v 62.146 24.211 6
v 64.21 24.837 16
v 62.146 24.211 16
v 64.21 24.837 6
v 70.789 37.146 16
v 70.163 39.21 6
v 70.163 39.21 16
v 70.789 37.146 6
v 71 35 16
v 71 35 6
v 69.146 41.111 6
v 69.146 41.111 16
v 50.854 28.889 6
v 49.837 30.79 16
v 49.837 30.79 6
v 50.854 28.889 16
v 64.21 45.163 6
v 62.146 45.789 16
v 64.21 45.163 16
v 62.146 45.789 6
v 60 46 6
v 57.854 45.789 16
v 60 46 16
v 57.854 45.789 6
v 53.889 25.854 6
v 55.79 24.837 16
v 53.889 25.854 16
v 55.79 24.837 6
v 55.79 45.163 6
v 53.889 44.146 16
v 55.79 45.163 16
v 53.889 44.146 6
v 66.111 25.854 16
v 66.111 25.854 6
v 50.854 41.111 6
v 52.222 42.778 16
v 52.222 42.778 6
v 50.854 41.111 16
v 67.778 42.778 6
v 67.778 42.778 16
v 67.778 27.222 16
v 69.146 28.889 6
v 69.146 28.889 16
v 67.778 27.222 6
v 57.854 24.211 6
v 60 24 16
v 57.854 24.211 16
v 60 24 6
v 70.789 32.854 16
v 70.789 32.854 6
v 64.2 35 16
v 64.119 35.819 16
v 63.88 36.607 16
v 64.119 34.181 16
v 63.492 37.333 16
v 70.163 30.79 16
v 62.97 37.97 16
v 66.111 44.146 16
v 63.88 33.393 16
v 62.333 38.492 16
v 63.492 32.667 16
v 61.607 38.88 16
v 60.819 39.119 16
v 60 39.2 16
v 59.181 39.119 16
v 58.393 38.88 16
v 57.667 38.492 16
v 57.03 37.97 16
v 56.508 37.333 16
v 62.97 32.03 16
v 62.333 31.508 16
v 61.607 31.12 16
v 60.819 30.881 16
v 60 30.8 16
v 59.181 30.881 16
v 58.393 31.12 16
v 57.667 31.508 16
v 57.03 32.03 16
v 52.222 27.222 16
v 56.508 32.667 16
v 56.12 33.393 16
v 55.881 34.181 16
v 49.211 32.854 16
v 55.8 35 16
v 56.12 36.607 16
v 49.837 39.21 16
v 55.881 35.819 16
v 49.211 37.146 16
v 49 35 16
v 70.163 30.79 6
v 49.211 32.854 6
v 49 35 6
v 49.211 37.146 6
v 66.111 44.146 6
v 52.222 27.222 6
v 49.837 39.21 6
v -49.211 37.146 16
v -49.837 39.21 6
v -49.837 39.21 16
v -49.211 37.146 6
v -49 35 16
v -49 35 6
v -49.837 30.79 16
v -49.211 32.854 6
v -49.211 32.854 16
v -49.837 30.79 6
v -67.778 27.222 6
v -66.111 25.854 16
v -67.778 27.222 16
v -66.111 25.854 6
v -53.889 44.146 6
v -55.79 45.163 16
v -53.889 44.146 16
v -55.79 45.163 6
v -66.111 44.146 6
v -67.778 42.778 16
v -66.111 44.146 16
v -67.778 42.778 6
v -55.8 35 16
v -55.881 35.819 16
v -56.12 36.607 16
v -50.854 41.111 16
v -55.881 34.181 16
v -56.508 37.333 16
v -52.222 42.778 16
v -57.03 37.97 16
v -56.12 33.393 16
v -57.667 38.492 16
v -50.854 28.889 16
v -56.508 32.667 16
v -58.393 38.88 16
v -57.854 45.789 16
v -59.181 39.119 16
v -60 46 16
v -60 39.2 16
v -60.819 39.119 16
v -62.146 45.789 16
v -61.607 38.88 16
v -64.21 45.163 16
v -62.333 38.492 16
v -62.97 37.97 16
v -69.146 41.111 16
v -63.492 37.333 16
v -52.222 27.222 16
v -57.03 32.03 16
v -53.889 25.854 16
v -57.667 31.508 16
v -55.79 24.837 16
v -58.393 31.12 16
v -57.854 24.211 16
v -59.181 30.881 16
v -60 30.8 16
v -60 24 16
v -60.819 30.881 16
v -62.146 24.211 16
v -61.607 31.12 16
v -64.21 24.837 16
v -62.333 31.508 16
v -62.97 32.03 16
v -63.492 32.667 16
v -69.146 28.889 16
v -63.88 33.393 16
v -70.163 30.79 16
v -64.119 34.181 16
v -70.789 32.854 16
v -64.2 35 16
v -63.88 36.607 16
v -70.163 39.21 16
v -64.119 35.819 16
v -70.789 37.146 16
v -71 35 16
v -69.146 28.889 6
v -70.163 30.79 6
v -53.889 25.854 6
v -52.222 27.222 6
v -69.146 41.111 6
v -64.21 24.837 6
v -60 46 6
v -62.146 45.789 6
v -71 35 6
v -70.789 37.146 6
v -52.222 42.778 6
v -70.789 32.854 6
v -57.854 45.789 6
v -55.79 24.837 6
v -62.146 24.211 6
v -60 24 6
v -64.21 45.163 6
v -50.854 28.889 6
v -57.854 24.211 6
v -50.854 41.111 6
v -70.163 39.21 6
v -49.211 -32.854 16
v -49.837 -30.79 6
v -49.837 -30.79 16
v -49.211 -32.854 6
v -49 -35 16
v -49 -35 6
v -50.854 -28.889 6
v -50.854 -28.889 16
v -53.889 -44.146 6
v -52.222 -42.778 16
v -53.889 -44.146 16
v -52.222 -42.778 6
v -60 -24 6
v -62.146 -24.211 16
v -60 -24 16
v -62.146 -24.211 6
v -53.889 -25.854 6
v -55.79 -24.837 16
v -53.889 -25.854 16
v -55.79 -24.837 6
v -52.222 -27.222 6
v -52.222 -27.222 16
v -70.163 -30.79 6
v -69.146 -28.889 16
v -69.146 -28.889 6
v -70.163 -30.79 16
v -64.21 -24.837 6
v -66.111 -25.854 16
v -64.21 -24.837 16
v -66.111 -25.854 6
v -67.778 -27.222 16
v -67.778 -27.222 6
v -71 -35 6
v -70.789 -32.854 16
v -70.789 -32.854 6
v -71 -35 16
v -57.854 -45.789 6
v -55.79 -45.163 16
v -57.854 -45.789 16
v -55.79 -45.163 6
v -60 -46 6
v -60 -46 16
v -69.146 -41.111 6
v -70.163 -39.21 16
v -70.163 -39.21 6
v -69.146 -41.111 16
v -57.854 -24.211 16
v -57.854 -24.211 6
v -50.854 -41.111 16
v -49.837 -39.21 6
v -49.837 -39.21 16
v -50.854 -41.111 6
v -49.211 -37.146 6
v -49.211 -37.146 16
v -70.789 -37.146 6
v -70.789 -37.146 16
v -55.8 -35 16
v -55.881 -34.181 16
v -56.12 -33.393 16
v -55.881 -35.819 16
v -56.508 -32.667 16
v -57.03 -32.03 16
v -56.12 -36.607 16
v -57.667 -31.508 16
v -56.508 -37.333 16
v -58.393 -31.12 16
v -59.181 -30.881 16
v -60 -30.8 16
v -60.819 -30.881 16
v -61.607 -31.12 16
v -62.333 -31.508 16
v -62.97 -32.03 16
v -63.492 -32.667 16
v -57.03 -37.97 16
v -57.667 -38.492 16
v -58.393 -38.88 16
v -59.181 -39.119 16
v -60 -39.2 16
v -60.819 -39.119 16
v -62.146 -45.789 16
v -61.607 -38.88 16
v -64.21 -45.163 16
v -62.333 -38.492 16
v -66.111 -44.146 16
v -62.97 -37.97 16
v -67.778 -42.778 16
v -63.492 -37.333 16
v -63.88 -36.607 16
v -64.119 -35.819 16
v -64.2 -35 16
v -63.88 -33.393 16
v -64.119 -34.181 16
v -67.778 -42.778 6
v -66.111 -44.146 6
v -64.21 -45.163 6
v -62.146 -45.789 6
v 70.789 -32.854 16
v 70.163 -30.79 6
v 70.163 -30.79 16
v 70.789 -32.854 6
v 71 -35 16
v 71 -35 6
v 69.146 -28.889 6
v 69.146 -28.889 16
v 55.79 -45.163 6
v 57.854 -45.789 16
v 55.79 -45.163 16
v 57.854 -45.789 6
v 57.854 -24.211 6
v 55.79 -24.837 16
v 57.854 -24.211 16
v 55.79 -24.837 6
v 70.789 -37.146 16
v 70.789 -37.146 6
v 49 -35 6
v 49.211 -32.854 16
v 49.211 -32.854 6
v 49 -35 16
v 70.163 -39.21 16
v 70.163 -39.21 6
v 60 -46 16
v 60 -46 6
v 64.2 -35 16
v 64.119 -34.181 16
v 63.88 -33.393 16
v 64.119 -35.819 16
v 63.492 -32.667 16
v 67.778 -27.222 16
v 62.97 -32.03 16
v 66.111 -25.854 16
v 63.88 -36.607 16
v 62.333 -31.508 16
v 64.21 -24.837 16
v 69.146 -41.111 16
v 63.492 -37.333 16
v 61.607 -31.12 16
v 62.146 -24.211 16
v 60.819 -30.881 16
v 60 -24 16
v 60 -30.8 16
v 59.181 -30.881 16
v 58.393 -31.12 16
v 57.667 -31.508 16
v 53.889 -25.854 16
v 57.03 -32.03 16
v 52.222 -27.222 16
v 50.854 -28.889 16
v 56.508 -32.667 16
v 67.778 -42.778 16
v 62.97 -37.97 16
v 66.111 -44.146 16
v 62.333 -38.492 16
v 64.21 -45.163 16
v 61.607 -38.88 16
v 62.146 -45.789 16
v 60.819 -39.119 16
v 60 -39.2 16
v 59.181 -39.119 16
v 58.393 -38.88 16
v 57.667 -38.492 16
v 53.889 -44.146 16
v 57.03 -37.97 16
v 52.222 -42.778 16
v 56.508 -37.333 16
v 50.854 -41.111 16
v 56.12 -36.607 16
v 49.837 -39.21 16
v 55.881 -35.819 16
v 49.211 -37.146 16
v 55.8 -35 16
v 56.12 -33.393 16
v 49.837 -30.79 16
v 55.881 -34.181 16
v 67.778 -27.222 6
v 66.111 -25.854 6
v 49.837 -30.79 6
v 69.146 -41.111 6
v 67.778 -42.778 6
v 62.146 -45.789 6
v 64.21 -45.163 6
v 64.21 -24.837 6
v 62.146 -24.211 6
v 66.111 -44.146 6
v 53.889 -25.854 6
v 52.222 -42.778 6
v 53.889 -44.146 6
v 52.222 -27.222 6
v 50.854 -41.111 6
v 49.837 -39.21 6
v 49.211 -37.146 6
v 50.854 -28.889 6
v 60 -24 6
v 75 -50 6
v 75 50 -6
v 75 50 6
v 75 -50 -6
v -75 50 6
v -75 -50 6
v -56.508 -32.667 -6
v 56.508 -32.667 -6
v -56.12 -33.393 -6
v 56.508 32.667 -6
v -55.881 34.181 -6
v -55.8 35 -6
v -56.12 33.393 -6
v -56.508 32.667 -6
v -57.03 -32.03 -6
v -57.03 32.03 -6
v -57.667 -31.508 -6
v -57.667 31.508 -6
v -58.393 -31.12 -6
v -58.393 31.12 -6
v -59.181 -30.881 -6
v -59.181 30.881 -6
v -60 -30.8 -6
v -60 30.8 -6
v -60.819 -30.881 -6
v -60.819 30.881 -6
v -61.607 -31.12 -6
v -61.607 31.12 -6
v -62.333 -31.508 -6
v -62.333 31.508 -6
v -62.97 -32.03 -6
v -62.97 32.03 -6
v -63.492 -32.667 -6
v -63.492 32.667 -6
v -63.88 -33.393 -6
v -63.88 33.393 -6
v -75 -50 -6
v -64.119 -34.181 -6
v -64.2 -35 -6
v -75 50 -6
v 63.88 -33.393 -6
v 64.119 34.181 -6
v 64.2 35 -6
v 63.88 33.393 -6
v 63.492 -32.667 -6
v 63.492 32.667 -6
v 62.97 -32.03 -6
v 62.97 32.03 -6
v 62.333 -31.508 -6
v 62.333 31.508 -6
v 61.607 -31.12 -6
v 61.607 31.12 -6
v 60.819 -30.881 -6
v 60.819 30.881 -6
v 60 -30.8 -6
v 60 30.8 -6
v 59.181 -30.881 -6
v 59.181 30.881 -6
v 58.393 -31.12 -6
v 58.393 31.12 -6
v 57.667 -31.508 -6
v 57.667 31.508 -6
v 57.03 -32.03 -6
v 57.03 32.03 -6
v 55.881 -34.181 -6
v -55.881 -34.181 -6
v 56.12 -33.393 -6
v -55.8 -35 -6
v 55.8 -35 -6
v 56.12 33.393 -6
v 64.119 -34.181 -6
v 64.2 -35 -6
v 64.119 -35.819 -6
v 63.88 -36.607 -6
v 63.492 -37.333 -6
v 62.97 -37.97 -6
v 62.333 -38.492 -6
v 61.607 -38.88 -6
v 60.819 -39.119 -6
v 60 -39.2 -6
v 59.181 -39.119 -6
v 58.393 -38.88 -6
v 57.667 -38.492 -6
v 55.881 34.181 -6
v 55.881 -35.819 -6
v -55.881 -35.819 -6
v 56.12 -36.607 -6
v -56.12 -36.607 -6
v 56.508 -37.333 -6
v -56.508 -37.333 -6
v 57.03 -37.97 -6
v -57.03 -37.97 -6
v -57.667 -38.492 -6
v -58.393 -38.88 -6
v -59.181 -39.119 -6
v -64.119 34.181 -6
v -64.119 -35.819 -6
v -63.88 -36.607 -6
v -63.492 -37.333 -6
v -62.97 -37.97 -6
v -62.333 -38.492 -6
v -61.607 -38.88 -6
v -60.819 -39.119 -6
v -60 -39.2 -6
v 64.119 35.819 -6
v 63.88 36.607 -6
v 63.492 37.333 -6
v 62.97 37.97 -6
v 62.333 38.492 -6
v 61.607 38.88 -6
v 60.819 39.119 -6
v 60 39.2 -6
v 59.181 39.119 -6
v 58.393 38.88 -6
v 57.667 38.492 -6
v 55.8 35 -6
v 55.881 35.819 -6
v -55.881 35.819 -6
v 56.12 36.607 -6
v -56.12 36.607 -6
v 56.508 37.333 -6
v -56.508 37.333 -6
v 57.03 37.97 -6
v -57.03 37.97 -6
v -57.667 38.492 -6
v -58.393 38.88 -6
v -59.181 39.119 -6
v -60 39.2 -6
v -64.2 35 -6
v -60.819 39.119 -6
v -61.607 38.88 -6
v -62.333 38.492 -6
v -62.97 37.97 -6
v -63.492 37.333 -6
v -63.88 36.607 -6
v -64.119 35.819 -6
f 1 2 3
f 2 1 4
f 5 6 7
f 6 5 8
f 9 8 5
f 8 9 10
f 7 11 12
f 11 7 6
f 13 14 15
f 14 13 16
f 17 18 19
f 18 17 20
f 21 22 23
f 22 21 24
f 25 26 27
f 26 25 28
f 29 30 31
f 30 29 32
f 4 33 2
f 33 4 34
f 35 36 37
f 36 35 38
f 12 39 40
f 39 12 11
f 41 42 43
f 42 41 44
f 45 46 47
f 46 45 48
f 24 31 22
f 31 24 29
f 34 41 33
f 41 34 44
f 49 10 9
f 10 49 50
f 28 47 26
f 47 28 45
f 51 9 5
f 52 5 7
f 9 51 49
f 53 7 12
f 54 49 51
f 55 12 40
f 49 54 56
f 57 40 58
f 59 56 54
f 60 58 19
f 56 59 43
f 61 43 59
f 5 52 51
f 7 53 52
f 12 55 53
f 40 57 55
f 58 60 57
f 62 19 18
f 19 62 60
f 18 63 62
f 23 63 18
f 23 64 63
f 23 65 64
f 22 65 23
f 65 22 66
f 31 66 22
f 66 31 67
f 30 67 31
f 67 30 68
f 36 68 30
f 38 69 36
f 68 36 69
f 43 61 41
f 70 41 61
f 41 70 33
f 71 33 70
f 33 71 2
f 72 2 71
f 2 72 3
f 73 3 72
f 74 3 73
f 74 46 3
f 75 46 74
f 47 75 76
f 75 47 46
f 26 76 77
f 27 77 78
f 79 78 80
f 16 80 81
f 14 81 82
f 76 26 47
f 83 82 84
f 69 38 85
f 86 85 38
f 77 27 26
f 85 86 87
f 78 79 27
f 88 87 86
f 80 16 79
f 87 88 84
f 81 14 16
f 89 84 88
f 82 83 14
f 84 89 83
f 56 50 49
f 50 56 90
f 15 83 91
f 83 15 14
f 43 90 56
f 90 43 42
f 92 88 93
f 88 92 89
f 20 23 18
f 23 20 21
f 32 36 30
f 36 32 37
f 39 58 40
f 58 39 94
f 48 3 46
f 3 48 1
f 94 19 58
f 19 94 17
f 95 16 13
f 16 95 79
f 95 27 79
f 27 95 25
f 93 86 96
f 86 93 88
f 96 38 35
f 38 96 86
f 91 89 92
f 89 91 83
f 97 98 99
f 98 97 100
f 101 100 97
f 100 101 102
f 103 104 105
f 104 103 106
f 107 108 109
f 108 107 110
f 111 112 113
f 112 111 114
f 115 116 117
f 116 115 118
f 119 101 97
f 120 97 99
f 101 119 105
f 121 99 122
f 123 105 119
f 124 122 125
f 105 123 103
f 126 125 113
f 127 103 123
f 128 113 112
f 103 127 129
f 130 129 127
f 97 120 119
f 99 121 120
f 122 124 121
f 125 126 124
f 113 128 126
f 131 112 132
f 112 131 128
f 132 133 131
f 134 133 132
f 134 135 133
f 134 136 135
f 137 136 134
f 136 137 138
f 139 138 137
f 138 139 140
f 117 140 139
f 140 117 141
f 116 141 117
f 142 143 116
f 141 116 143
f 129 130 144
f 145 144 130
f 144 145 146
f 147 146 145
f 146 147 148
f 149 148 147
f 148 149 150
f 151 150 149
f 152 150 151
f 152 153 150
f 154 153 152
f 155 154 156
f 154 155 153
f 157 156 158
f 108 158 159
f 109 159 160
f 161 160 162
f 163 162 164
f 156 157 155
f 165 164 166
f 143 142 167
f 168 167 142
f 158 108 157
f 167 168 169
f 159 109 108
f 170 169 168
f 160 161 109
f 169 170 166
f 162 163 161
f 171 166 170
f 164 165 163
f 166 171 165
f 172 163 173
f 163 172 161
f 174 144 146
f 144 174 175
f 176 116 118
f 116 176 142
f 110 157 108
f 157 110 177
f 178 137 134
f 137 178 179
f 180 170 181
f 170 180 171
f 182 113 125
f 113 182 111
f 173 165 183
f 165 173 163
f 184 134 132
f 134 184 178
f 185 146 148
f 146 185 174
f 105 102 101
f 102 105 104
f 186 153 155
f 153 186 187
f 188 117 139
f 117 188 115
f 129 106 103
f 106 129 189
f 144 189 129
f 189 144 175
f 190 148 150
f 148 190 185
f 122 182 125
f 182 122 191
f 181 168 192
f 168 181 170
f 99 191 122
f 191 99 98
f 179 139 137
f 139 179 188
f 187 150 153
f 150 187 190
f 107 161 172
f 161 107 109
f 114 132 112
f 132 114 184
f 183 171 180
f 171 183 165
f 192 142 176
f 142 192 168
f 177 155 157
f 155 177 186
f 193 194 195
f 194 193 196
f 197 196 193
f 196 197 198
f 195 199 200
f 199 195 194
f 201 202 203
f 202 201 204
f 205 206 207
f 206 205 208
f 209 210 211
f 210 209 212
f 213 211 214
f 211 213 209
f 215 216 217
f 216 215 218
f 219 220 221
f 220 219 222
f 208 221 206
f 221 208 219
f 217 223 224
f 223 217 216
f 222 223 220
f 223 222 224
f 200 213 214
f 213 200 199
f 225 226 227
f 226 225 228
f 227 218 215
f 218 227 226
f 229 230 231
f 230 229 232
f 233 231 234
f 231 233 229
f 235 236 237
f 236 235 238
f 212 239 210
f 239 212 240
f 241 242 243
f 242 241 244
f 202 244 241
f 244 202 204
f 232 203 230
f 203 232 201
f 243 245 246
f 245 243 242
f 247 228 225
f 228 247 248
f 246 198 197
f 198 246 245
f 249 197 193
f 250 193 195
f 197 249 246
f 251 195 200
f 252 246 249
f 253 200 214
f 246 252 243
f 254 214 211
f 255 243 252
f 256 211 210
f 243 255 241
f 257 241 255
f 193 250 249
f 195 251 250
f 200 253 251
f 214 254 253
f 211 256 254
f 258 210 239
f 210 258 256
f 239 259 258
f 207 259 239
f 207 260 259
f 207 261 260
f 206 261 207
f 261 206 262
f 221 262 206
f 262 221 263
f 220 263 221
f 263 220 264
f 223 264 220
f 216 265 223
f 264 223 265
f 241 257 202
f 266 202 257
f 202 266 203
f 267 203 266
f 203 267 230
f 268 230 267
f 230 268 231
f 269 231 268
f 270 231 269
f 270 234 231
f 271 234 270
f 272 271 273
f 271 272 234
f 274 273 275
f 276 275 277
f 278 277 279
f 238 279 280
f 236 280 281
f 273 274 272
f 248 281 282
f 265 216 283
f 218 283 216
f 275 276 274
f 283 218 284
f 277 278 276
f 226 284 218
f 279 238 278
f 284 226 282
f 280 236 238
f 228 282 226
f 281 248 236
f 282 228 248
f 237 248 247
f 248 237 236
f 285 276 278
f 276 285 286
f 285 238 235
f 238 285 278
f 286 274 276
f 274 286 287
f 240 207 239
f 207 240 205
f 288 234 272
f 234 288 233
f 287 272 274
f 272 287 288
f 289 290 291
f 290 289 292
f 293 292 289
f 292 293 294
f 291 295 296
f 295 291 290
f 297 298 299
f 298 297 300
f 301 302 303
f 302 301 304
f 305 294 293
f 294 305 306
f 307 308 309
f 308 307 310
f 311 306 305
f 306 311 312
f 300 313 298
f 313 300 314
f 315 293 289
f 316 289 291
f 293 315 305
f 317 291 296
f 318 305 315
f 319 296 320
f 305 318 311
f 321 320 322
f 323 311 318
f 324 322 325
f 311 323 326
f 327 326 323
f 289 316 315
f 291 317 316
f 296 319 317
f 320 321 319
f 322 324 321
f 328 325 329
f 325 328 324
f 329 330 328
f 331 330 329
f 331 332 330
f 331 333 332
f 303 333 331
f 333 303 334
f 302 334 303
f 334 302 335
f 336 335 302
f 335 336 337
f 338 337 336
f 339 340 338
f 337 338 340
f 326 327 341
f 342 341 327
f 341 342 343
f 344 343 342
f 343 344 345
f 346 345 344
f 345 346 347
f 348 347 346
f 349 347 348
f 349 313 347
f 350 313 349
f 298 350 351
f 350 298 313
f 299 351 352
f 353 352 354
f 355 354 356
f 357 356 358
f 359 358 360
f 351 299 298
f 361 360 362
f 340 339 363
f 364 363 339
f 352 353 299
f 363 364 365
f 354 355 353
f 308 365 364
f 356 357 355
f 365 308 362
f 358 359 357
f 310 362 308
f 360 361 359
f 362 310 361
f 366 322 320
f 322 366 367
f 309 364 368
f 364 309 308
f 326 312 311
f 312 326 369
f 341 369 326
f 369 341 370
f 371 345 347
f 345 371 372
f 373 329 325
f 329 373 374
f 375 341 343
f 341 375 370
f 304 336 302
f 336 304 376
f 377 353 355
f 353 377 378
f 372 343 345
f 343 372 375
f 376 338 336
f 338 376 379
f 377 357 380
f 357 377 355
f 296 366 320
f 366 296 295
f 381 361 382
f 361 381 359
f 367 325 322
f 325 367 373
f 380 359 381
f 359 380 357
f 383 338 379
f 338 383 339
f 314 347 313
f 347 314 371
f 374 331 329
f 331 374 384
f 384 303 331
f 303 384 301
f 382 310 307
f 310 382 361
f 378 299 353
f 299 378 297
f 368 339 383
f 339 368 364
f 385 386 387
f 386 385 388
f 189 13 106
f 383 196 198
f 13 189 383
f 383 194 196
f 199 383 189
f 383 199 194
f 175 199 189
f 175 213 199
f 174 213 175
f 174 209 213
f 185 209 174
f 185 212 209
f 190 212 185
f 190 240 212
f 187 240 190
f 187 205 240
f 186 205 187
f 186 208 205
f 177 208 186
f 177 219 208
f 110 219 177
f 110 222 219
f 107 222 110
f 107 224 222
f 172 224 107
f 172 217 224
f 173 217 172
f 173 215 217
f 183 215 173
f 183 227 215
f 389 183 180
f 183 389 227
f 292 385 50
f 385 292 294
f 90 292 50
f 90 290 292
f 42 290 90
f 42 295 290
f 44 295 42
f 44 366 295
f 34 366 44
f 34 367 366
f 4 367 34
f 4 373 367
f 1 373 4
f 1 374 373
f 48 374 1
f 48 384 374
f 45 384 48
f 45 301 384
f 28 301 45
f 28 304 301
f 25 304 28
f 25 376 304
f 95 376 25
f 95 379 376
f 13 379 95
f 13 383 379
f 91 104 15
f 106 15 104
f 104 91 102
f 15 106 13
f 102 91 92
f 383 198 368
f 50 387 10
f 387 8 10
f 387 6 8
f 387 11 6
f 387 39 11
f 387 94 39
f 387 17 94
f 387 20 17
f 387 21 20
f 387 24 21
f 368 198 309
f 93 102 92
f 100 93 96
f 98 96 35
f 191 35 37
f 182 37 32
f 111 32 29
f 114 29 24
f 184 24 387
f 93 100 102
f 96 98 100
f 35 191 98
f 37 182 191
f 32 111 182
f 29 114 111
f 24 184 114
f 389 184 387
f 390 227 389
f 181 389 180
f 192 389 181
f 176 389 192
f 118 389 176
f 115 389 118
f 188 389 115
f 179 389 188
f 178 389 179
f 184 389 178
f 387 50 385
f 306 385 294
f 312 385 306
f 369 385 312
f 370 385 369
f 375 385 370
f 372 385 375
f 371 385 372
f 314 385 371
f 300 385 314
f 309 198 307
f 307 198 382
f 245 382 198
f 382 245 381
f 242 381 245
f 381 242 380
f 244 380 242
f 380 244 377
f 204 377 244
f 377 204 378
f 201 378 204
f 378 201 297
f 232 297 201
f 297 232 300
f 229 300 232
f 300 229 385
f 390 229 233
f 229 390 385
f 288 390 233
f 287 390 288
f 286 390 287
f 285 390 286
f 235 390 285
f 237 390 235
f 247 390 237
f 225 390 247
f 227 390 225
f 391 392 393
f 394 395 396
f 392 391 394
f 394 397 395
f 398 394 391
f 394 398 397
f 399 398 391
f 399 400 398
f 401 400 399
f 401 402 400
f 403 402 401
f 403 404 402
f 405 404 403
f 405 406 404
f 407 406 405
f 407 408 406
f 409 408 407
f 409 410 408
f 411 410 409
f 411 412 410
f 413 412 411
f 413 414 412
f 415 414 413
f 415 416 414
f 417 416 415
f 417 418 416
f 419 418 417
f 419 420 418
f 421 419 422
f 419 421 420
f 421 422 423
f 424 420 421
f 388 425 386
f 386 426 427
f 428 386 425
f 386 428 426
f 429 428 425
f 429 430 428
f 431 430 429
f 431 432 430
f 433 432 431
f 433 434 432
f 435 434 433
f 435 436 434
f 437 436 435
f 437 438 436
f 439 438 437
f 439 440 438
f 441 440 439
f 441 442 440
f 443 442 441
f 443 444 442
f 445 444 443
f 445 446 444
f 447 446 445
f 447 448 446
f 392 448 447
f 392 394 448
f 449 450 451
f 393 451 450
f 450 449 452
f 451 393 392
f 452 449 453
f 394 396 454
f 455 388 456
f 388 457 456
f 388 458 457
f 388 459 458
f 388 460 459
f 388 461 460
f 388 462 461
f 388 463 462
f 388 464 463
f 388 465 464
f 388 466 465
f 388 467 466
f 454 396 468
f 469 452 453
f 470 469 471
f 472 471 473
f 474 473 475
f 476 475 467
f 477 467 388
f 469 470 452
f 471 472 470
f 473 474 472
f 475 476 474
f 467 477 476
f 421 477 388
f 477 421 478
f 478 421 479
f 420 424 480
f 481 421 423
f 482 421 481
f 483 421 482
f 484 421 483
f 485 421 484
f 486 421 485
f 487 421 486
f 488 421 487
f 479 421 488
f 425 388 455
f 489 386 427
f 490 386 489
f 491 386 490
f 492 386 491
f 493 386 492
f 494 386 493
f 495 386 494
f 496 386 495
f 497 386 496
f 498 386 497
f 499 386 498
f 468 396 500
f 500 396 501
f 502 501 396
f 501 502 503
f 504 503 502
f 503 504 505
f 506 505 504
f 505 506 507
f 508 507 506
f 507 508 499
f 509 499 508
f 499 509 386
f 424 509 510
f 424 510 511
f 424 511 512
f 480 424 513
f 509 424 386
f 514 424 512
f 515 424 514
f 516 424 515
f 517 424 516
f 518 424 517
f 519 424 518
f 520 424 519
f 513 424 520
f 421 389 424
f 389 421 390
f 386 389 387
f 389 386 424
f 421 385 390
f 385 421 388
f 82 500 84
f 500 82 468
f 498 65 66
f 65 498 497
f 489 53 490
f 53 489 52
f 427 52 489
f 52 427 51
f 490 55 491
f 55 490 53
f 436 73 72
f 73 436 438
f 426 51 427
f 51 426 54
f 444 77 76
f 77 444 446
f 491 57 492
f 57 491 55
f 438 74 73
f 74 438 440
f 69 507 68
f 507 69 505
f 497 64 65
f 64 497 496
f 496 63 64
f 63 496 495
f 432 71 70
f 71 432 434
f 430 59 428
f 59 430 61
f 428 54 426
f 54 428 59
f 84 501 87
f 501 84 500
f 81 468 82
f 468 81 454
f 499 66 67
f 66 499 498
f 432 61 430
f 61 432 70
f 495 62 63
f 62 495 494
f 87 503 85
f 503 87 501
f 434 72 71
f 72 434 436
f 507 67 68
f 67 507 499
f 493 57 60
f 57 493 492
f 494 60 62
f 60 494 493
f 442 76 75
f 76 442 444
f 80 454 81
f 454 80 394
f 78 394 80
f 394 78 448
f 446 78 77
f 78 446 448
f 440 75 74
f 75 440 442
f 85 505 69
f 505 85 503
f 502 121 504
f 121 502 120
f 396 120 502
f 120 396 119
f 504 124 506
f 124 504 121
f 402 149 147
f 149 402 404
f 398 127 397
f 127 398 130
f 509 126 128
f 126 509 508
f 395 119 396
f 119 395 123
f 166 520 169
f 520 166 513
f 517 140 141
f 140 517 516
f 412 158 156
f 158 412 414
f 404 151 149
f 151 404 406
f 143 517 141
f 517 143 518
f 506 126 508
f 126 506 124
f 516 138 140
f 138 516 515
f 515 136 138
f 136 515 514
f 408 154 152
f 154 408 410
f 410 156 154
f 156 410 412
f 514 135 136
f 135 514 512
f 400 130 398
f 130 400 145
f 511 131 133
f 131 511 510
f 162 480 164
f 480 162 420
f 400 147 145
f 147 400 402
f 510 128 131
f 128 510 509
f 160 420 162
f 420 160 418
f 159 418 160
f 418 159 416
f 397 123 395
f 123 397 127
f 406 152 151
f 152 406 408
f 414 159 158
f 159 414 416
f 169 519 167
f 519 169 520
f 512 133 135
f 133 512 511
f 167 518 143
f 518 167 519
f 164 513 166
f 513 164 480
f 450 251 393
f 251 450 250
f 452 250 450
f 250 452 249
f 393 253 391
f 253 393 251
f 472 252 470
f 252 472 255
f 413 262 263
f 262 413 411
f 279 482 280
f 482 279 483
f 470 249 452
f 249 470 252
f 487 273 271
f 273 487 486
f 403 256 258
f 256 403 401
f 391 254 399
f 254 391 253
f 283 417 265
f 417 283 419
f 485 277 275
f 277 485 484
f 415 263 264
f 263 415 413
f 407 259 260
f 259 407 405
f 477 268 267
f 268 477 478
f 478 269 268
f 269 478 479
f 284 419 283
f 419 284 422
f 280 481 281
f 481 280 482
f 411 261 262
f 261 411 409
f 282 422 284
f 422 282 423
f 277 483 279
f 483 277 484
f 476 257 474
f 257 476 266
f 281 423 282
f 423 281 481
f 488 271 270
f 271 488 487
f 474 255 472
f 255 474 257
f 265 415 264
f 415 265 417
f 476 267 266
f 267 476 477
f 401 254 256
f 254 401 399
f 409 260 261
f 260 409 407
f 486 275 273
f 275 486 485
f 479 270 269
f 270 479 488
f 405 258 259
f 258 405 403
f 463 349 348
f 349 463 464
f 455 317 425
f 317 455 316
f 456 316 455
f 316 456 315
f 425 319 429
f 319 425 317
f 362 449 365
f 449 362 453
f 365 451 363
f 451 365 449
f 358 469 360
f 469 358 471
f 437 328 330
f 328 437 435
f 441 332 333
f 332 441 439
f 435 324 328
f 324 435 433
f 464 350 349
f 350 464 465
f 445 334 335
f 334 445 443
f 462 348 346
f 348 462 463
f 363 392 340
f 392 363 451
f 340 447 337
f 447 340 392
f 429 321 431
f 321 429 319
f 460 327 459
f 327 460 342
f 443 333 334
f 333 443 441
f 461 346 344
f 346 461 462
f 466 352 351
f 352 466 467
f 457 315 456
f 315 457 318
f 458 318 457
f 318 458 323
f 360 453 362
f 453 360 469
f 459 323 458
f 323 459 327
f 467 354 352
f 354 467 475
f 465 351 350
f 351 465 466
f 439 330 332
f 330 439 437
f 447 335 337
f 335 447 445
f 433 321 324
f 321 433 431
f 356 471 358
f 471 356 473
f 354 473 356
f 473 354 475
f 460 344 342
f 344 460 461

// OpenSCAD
$fn = 32;

// ----------------------------------------------------------------------
// Anchor pads 150 x 100 x 22
// four corner bosses with anchor holes
// ----------------------------------------------------------------------

// --- parameters (mm) ---
plate = [150, 100, 12];  // base plate size (x, y, z)
pads = 4;                // boss count, one per corner
edge = 15;               // boss centre offset from the plate edge
boss_d = 22;             // boss diameter
boss_h = 10;             // boss height above the base plate
hole_d = 8.4;            // hole diameter

// --- derived feature positions (mm) ---
height = plate[2] + boss_h;      // = 22   overall height of the part
corner_x = plate[0] / 2 - edge;  // = 60   boss centre X
corner_y = plate[1] / 2 - edge;  // = 35   boss centre Y
feature_centers = [
  [corner_x, corner_y],
  [-corner_x, corner_y],
  [-corner_x, -corner_y],
  [corner_x, -corner_y]
];   // boss centres, anchor holes are drilled there

// base plate, four bosses standing on it, anchor holes all the way through
difference() {
  union() {
    cube(plate, center = true);
    for (centre = feature_centers)
      translate([centre[0], centre[1], plate[2] / 2 - 1])
        cylinder(d = boss_d, h = boss_h + 1);
  }
  for (centre = feature_centers)
    translate([centre[0], centre[1], -height])
      cylinder(d = hole_d, h = 2 * height + 2);  // through boss and plate
}
